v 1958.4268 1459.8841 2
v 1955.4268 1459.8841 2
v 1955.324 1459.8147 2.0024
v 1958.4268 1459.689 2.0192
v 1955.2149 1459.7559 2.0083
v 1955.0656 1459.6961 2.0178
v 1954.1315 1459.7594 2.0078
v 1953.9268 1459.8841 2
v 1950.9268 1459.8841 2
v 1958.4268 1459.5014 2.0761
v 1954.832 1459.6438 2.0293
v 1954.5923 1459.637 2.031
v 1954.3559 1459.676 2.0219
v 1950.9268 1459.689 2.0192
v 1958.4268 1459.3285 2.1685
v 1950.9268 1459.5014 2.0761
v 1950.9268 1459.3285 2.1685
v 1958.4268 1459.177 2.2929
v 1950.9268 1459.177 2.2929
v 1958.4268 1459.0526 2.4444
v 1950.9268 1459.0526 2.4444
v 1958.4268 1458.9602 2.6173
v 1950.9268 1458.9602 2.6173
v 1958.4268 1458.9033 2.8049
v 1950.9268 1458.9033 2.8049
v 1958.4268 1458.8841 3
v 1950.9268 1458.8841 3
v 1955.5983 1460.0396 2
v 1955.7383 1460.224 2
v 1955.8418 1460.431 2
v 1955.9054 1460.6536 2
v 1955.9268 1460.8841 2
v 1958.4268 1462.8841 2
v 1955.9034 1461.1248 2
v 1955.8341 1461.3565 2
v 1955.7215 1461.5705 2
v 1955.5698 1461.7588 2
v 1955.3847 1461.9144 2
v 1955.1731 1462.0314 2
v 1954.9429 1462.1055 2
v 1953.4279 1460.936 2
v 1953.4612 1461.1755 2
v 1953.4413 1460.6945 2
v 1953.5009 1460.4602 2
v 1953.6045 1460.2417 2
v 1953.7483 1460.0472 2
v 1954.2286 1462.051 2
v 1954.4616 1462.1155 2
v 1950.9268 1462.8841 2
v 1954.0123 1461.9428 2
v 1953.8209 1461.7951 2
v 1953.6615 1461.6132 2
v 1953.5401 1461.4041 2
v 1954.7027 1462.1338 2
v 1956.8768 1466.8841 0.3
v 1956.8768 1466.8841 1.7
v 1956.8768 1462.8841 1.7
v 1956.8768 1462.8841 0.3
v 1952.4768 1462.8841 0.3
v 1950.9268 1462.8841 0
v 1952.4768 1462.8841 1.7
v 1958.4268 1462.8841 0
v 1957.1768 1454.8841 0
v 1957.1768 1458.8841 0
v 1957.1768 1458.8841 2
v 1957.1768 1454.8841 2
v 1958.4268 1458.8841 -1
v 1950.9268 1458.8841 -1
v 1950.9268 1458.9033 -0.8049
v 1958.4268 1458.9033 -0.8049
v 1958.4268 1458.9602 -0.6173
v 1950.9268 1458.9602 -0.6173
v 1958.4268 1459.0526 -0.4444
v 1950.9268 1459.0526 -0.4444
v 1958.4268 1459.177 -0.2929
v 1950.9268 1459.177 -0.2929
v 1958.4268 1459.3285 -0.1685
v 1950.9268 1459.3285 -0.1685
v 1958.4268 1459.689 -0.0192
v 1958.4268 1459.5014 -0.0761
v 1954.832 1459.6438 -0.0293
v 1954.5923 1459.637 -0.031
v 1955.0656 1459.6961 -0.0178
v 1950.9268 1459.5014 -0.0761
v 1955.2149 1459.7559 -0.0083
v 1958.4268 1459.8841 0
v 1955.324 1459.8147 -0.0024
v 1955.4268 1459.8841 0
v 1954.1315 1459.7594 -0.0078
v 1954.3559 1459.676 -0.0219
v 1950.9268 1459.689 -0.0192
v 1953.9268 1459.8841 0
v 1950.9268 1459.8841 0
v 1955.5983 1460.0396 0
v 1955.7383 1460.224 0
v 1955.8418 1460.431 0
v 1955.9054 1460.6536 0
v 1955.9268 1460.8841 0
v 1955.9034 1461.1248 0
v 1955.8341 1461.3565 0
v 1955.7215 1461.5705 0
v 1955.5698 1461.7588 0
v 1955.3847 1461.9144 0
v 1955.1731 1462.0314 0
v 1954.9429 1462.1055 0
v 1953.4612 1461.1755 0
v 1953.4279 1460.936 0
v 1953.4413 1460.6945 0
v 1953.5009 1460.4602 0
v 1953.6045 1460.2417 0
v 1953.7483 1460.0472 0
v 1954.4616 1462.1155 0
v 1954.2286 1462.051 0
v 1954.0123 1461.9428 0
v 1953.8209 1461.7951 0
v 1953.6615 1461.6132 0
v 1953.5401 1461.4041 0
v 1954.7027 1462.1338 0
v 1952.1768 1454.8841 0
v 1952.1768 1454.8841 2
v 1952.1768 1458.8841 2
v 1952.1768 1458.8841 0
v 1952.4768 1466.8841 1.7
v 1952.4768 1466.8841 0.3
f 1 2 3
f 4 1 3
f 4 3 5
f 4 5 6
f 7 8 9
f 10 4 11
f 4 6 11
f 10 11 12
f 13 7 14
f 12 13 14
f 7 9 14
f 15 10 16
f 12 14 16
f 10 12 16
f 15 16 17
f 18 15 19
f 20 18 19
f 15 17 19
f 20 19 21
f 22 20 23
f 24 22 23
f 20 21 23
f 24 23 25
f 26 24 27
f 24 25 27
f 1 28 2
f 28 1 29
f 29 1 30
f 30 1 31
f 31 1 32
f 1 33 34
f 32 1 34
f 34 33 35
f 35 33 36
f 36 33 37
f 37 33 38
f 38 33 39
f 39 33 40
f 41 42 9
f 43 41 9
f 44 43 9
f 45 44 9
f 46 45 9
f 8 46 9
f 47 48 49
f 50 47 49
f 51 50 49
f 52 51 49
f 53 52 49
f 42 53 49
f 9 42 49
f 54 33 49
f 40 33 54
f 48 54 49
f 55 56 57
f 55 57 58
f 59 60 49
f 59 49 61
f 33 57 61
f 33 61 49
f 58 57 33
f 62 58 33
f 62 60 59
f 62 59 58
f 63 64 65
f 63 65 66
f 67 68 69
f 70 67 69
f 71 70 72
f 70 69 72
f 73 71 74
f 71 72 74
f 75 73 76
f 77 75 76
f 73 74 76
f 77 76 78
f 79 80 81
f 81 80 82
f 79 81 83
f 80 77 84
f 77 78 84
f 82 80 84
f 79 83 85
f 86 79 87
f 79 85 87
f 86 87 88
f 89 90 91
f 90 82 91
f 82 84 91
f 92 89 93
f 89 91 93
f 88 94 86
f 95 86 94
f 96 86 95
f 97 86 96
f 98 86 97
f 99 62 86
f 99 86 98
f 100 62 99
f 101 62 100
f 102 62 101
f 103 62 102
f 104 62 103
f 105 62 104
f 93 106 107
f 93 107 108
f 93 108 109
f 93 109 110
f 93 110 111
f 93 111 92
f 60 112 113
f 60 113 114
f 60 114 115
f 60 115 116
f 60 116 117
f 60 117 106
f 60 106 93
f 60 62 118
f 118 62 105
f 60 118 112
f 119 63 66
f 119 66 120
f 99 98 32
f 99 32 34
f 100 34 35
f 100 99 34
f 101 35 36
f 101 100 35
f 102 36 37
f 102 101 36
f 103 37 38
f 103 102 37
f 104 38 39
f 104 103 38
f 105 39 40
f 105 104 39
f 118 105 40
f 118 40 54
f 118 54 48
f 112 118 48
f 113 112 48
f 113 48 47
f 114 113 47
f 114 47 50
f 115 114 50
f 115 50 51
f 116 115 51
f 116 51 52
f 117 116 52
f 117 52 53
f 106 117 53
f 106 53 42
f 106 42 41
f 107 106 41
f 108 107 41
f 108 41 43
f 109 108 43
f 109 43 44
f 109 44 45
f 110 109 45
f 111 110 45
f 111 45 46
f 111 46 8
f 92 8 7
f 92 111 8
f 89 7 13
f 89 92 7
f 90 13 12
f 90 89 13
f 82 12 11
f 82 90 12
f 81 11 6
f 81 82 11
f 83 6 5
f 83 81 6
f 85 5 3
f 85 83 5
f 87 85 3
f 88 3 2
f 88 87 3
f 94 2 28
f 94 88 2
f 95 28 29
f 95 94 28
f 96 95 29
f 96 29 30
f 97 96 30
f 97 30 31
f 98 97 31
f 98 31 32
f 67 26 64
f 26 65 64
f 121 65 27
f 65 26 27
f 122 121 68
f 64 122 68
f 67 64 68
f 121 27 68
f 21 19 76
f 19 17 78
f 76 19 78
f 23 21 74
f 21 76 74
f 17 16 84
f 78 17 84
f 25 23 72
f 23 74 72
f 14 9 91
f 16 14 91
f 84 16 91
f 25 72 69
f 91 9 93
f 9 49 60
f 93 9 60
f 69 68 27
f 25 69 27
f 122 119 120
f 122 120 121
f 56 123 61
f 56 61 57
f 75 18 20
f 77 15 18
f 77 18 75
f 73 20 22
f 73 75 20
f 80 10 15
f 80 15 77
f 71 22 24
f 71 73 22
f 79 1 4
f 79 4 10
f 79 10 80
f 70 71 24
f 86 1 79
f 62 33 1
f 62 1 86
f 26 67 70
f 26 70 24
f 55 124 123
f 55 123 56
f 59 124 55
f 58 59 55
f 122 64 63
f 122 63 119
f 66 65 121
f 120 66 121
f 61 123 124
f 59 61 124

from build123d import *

# Parameters (mm, degrees)
SKETCH1_R               = 1.25
BOSS_EXTRUDE1_DEPTH     = 2
BOSS_EXTRUDE2_DEPTH     = 7.5
SKETCH3_R               = 1.25
CUT_EXTRUDE1_DEPTH      = 2
CUT_EXTRUDE1_DEPTH_BACK = 4
SKETCH4_W               = 5
SKETCH4_H               = 2
SKETCH4_W_2             = 4.4
SKETCH4_H_2             = 1.4
CUT_EXTRUDE2_DEPTH      = 4


with BuildPart() as part:
    # Sketch1 → Boss-Extrude1 (new body)
    with BuildSketch(Plane.XY):
        Polygon((1952.176808721, 1466.884115951), (1957.176808721, 1466.884115951), (1957.176808721, 1462.884115951), (1958.426808721, 1462.884115951), (1958.426808721, 1458.884115951), (1957.176808721, 1458.884115951), (1957.176808721, 1454.884115951), (1952.176808721, 1454.884115951), (1952.176808721, 1458.884115951), (1950.926808721, 1458.884115951), (1950.926808721, 1462.884115951), (1952.176808721, 1462.884115951), align=None)
        with Locations((1954.676808721, 1460.884115951)):
            Circle(SKETCH1_R, mode=Mode.SUBTRACT)
    extrude(amount=BOSS_EXTRUDE1_DEPTH)

    # Sketch2 → Boss-Extrude2 (add)
    with BuildSketch(Plane.ZY.offset(-1950.926808721)):
        with BuildLine():
            Line((2, 1458.884115951), (2, 1459.884115951))
            ThreePointArc((2, 1459.884115951), (2.292893219, 1459.17700917), (3, 1458.884115951))
            Line((3, 1458.884115951), (2, 1458.884115951))
        make_face()
        with BuildLine():
            Line((0, 1458.884115951), (-1, 1458.884115951))
            ThreePointArc((-1, 1458.884115951), (-0.292893219, 1459.17700917), (0, 1459.884115951))
            Line((0, 1459.884115951), (0, 1458.884115951))
        make_face()
    extrude(amount=-BOSS_EXTRUDE2_DEPTH)

    # Sketch3 → Cut-Extrude1 (cut, two sides)
    with BuildSketch(Plane.XY.offset(2)) as cut_extrude1_sk:
        with Locations((1954.676808721, 1460.884115951)):
            Circle(SKETCH3_R)
    extrude(amount=CUT_EXTRUDE1_DEPTH, mode=Mode.SUBTRACT)
    extrude(cut_extrude1_sk.sketch, amount=-CUT_EXTRUDE1_DEPTH_BACK, mode=Mode.SUBTRACT)

    # Sketch4 → Cut-Extrude2 (cut)
    with BuildSketch(Plane(origin=(0, 1466.884115951, 0), x_dir=(1, 0, 0), z_dir=(0, 1, 0))):
        with Locations((1954.676808721, -1)):
            Rectangle(SKETCH4_W, SKETCH4_H)
        with Locations((1954.676808721, -1)):
            Rectangle(SKETCH4_W_2, SKETCH4_H_2, mode=Mode.SUBTRACT)
    extrude(amount=-CUT_EXTRUDE2_DEPTH, mode=Mode.SUBTRACT)


solid = part.part
